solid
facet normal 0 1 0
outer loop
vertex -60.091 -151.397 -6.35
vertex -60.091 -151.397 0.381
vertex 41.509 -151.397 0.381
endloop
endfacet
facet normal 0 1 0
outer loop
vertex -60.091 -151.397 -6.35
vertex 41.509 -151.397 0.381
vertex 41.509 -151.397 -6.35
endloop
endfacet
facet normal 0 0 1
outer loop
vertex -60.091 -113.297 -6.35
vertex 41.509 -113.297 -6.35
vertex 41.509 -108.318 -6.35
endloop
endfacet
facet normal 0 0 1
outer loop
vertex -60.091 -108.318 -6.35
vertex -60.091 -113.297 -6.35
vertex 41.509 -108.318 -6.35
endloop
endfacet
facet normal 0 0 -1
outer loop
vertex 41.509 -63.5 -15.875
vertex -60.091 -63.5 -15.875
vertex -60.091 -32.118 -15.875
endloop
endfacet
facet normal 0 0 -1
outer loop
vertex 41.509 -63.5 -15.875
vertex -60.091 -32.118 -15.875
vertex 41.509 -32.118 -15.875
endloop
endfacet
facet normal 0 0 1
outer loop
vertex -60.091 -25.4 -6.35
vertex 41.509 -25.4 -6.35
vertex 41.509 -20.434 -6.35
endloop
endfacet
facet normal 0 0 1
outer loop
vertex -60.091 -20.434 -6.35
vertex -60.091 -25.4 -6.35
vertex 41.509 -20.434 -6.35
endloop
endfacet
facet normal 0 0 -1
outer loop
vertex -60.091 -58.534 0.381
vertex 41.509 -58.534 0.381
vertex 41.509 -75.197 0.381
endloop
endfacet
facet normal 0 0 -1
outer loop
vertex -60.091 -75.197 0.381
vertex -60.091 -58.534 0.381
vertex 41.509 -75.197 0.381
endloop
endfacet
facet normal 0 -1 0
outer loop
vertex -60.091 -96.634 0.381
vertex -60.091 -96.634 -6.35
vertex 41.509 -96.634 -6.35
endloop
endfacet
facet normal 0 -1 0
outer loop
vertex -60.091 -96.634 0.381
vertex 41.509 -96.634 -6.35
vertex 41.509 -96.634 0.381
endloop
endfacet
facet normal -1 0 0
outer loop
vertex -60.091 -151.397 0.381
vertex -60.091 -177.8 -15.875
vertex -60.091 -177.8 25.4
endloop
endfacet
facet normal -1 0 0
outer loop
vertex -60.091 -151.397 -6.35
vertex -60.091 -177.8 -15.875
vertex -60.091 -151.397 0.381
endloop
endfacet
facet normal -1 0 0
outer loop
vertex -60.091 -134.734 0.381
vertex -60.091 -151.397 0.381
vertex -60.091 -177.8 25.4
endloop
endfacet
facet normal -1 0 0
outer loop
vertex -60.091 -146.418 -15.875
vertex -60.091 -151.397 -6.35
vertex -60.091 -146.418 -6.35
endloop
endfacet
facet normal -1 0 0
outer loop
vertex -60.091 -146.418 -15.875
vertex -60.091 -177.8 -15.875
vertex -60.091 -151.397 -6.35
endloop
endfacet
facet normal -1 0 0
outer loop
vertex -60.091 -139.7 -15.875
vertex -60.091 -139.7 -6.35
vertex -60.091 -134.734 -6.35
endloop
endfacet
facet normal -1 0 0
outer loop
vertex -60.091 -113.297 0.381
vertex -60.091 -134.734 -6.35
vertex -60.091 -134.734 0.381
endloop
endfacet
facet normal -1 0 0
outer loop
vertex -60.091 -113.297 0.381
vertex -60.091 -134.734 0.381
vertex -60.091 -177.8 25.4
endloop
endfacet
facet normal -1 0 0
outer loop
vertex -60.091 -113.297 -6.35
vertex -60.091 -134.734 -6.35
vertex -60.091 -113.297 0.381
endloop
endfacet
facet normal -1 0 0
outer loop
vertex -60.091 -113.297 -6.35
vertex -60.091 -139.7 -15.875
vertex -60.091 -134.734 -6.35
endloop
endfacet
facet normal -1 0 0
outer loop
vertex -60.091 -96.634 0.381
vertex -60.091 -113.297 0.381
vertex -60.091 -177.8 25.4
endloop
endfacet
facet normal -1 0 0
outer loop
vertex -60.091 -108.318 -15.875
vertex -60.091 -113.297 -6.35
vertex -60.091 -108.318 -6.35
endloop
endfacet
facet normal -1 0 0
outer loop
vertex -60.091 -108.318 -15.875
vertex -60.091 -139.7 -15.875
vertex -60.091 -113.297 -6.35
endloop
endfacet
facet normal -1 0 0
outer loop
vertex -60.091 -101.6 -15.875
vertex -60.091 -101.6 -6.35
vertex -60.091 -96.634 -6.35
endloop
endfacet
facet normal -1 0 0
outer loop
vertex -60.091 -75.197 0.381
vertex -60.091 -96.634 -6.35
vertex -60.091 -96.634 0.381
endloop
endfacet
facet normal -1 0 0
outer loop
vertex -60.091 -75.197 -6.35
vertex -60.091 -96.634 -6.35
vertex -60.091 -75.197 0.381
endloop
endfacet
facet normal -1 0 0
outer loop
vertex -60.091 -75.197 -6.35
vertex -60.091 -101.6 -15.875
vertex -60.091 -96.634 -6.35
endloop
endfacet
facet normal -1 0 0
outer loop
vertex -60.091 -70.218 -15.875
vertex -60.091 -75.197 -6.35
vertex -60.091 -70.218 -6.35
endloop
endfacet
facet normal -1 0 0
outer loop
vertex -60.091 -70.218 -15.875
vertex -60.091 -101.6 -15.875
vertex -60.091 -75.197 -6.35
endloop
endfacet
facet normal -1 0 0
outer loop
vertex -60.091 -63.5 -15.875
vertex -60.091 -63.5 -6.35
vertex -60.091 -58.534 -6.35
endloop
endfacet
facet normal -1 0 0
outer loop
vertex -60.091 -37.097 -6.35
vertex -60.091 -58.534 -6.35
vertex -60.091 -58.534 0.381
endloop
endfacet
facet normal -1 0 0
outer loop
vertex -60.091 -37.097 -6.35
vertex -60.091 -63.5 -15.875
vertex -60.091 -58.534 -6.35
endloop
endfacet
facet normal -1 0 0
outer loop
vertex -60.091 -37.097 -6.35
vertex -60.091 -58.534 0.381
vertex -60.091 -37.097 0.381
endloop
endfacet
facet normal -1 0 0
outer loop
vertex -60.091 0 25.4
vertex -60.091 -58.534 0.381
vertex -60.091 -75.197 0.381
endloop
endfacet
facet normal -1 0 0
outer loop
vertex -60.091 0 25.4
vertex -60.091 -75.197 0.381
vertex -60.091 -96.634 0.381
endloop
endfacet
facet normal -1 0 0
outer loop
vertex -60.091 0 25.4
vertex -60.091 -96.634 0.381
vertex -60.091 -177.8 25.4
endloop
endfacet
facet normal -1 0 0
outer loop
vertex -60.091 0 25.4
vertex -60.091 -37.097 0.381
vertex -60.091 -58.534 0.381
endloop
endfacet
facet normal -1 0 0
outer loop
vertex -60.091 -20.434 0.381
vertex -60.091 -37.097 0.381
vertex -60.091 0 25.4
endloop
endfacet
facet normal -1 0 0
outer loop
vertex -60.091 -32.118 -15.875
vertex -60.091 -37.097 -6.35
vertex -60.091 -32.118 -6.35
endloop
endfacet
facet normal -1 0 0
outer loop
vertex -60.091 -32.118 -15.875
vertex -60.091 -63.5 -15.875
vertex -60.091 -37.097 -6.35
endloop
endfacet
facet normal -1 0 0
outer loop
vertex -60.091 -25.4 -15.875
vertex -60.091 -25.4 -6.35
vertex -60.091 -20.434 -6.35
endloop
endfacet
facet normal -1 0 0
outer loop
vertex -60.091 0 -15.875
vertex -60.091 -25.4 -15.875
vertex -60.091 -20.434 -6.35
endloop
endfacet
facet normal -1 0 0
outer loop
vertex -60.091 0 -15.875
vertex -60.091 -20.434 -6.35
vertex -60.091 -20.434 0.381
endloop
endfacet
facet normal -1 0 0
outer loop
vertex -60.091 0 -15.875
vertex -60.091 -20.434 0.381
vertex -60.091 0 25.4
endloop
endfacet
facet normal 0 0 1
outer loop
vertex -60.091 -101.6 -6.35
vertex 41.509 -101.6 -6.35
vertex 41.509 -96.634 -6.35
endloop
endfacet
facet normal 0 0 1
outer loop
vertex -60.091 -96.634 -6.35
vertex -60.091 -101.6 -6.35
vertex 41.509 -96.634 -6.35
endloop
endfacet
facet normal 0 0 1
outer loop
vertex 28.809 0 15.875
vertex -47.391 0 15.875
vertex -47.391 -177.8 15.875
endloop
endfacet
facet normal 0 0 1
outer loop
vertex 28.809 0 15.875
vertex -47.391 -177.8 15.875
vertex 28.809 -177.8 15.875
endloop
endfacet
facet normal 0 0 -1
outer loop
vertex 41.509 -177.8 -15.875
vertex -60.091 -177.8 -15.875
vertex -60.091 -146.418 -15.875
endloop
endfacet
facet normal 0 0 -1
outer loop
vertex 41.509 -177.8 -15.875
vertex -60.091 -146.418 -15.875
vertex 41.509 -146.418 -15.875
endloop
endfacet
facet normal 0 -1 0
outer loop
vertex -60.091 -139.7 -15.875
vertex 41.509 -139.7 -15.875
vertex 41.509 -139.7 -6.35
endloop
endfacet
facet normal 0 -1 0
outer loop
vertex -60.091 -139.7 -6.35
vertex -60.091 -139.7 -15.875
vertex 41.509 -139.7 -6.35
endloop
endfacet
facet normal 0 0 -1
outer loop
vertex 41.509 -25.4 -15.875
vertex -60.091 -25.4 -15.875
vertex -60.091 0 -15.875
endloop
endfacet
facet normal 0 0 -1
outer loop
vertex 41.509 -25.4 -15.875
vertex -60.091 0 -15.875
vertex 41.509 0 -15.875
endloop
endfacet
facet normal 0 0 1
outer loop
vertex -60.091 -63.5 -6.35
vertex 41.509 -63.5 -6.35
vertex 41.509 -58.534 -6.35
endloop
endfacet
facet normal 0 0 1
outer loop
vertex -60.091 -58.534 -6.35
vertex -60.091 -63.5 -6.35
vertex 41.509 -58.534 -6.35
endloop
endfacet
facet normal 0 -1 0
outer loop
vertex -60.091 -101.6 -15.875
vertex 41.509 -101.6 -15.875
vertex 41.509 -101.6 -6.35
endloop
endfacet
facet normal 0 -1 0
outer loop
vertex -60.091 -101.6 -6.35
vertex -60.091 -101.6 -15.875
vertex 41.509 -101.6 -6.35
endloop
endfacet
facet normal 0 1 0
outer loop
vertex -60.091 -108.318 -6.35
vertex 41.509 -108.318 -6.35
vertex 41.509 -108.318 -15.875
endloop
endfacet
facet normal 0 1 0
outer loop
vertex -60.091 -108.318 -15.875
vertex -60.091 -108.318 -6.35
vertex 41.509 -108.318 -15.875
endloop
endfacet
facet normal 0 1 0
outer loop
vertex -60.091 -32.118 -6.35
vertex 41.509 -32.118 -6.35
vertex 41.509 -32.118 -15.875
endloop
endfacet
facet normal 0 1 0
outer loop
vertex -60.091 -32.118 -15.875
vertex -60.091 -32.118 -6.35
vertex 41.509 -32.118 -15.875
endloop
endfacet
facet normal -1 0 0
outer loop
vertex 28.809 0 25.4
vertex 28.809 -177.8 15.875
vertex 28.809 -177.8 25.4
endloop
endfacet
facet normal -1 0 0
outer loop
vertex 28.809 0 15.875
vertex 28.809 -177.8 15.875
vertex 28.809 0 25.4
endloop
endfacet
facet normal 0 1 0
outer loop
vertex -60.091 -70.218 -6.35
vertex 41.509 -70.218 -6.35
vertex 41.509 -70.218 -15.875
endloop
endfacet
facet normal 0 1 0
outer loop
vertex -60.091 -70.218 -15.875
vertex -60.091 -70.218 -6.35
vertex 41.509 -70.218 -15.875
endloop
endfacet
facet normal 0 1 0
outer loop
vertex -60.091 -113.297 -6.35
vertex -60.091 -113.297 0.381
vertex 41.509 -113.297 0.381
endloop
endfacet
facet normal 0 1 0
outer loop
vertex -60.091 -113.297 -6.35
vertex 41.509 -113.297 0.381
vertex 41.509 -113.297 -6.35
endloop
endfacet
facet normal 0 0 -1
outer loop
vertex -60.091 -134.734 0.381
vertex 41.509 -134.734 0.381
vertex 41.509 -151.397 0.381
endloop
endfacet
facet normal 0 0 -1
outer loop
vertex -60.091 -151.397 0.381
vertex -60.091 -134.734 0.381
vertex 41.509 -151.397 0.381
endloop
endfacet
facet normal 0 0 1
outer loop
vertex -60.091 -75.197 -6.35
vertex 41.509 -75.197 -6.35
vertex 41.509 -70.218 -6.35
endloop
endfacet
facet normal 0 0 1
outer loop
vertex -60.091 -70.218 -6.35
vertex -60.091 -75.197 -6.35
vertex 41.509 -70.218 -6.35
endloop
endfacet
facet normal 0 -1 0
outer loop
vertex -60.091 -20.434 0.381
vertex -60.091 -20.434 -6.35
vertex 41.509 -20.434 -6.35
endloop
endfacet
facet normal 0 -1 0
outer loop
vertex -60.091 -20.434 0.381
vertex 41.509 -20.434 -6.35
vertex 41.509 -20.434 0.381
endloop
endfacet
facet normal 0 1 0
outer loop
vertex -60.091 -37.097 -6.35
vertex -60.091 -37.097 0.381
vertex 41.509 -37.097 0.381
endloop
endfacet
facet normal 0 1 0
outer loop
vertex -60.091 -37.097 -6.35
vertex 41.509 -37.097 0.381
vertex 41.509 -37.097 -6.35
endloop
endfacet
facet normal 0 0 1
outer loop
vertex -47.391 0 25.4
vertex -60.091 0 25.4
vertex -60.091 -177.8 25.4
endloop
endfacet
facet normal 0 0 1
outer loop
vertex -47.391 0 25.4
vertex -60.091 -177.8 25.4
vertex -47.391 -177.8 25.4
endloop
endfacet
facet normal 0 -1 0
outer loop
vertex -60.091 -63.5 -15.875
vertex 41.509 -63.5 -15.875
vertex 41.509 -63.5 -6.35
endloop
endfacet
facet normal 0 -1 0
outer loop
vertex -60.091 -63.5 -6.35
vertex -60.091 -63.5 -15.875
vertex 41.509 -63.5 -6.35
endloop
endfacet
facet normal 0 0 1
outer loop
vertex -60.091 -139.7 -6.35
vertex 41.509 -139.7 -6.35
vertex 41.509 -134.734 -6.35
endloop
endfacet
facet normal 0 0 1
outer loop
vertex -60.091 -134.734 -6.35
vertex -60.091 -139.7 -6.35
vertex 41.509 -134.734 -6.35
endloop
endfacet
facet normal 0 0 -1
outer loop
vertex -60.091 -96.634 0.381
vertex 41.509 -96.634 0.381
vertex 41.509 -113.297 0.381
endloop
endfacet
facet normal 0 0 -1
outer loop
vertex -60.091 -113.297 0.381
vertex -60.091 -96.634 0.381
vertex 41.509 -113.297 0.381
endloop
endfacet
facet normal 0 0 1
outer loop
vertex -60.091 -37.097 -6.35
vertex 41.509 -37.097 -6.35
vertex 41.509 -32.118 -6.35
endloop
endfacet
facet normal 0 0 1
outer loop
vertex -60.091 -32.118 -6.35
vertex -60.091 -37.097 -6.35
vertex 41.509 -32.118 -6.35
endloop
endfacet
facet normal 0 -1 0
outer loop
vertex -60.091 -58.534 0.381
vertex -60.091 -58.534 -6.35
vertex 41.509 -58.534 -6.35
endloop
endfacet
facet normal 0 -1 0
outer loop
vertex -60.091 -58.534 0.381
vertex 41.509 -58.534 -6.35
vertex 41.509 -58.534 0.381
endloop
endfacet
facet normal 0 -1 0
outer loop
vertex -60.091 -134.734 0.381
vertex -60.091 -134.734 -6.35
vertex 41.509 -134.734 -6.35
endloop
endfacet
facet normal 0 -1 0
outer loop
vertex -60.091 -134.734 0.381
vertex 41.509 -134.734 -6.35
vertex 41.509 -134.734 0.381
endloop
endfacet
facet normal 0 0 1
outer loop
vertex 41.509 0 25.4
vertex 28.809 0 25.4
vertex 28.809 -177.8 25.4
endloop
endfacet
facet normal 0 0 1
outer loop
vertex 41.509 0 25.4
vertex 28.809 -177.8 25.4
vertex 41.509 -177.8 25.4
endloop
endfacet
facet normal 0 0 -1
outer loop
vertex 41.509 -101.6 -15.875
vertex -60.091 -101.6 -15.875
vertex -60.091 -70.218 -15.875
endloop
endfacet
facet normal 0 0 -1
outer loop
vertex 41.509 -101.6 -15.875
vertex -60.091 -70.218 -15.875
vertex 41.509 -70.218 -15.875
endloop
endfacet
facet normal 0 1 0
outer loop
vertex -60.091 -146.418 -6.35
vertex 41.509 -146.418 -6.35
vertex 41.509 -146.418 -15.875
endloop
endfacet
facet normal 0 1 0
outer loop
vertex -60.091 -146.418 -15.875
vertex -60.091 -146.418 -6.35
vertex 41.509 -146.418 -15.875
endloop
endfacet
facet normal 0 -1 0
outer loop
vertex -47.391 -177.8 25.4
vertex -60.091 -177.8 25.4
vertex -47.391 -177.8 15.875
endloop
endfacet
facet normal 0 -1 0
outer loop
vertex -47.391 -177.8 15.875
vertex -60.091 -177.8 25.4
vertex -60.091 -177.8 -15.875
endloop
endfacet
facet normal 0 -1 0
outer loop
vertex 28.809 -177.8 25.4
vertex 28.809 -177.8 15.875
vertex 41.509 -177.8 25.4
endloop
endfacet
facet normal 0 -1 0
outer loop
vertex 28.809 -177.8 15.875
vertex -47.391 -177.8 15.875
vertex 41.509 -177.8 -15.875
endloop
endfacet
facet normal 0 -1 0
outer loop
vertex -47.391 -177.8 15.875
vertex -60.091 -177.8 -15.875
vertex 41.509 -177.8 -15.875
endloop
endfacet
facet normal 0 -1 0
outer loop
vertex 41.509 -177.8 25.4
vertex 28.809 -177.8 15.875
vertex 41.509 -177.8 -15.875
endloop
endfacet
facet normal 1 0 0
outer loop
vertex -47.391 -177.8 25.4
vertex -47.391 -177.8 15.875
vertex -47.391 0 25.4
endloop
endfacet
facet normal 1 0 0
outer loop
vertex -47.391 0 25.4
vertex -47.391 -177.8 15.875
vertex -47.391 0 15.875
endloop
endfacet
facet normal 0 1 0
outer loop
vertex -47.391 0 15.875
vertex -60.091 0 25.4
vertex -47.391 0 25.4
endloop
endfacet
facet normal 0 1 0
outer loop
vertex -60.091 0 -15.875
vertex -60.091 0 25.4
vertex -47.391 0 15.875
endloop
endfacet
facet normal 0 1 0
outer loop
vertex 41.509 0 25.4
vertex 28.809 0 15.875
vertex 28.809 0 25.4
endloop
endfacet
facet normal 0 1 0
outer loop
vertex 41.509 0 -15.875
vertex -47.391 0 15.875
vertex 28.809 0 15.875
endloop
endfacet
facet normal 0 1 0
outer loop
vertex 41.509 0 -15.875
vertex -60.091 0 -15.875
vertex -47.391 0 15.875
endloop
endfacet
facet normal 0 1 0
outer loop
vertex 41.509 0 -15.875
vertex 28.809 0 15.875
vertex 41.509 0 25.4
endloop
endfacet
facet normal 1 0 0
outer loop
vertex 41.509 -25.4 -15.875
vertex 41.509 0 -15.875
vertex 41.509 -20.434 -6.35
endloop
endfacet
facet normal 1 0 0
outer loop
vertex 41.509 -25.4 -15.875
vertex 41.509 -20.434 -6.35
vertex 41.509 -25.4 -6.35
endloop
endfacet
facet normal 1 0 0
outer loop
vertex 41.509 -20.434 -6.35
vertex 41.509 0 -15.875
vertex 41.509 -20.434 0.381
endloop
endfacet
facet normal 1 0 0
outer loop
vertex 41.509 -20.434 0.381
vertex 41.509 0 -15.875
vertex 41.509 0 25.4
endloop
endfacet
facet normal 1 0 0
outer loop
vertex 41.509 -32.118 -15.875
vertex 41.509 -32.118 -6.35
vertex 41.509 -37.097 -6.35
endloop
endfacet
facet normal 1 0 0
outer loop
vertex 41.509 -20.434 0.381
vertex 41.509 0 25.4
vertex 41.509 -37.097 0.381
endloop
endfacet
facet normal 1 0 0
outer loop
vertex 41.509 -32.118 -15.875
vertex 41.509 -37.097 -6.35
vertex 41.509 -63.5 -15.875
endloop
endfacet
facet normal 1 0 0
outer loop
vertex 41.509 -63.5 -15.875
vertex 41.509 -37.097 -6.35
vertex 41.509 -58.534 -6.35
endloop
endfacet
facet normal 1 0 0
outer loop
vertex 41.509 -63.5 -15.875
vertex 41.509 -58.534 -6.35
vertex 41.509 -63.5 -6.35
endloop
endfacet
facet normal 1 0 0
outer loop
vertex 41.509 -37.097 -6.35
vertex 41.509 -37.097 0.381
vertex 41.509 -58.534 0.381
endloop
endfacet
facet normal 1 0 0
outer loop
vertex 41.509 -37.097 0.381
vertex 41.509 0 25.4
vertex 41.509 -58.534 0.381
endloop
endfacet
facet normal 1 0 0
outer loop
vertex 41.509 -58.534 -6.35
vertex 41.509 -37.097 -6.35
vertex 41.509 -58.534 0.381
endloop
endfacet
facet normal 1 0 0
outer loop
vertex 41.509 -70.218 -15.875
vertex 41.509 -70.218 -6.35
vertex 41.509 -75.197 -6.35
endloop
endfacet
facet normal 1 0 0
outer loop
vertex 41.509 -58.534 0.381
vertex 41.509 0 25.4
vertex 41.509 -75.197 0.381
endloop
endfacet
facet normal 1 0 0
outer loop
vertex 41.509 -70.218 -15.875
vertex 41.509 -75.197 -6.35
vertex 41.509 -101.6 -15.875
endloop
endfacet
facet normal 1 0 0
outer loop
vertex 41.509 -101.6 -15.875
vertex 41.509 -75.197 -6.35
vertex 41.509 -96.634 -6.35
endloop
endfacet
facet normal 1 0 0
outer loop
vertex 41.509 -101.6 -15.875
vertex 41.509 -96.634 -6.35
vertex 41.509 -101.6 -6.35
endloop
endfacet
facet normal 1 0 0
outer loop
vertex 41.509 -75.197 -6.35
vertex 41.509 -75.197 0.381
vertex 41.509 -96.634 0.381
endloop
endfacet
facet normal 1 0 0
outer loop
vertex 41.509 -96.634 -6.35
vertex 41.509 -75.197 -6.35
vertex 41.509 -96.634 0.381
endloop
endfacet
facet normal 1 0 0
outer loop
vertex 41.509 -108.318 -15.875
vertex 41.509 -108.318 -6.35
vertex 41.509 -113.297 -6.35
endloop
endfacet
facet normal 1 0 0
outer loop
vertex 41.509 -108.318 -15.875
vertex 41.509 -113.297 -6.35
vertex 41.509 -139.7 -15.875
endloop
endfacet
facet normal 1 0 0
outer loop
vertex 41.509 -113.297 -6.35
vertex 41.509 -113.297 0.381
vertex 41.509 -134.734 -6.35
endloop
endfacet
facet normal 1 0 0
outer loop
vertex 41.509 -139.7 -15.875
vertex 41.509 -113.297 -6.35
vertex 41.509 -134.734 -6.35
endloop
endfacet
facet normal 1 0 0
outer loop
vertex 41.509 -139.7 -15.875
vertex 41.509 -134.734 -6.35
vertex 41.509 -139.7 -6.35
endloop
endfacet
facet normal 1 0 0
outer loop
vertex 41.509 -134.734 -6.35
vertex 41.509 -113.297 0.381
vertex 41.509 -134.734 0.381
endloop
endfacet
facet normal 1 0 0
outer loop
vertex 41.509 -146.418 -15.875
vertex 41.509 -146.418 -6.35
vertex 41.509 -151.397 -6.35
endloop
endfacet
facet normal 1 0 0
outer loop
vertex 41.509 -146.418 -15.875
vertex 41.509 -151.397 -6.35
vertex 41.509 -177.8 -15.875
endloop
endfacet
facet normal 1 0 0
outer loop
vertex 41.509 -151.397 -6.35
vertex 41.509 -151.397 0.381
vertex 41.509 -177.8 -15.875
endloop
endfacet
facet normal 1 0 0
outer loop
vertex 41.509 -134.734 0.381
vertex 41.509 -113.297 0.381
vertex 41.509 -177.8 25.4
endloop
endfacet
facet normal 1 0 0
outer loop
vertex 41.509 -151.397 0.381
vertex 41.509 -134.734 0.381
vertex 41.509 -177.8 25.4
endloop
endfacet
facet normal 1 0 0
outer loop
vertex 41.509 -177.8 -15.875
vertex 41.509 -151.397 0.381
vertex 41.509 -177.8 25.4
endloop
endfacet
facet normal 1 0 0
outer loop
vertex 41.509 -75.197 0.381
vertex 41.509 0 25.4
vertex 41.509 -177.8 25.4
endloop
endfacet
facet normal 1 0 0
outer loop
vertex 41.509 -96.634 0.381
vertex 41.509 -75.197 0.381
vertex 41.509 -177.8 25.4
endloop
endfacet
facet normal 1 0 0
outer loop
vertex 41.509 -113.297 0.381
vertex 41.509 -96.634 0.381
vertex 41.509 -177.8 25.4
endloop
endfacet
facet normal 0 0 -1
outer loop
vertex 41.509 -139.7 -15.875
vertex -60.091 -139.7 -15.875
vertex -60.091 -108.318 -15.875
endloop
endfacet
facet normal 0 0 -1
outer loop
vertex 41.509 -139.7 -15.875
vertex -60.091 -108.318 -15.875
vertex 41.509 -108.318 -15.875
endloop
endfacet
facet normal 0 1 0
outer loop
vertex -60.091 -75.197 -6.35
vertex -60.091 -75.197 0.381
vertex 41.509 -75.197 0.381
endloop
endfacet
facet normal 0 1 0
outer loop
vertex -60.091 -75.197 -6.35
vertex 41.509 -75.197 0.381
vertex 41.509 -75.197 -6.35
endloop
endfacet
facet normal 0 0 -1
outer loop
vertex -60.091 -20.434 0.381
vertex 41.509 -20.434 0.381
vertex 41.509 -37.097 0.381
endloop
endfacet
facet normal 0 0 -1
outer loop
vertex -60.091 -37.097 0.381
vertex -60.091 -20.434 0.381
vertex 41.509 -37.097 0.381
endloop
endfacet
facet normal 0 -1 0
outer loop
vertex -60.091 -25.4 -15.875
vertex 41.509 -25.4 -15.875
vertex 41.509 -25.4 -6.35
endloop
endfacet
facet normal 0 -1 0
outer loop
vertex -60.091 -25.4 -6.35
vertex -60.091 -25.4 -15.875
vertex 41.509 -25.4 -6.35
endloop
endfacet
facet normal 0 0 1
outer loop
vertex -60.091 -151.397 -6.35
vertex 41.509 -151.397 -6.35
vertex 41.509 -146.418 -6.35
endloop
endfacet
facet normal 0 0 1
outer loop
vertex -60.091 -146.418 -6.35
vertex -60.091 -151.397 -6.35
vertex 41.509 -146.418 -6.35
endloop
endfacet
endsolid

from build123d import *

# Parameters (mm, degrees)
F0_W      = 101.6
F0_H      = 177.8
F1_DEPTH  = 15.875
F1_FACE_W = 101.6
F1_FACE_H = 177.8
F2_DEPTH  = 15.875
F4_DEPTH  = 101.601
F5_W      = 12.7
F5_H      = 177.8
F6_DEPTH  = 9.525


with BuildPart() as f1:
    # F0 (on Top) → F1 (new body)
    with BuildSketch(Plane.XY):
        with Locations((-9.29141, -88.9)):
            Rectangle(F0_W, F0_H)
    extrude(amount=F1_DEPTH)

    # F1_face (on face) → F2 (join)
    with BuildSketch(Plane(origin=(-9.29141, -88.9, 0), x_dir=(1, 0, 0), z_dir=(0, 0, -1))):
        Rectangle(F1_FACE_W, F1_FACE_H)
    extrude(amount=F2_DEPTH)

    # F3 (on face) → F4 (cut, through all)
    with BuildSketch(Plane.YZ.offset(41.50859)):
        Polygon((-32.1183, -15.875), (-25.4, -15.875), (-25.4, -6.35), (-20.4343, -6.35), (-20.4343, 0.381), (-37.0967, 0.381), (-37.0967, -6.35), (-32.1183, -6.35), align=None)
        Polygon((-70.2183, -15.875), (-63.5, -15.875), (-63.5, -6.35), (-58.5343, -6.35), (-58.5343, 0.381), (-75.1967, 0.381), (-75.1967, -6.35), (-70.2183, -6.35), align=None)
        Polygon((-108.3183, -15.875), (-101.6, -15.875), (-101.6, -6.35), (-96.6343, -6.35), (-96.6343, 0.381), (-113.2967, 0.381), (-113.2967, -6.35), (-108.3183, -6.35), align=None)
        Polygon((-146.4183, -6.35), (-146.4183, -15.875), (-139.7, -15.875), (-139.7, -6.35), (-134.7343, -6.35), (-134.7343, 0.381), (-151.3967, 0.381), (-151.3967, -6.35), align=None)
    extrude(amount=-F4_DEPTH, mode=Mode.SUBTRACT)

    # F5 (on face) → F6 (join)
    with BuildSketch(Plane.XY.offset(15.875)):
        with Locations((-53.74141, -88.9)):
            Rectangle(F5_W, F5_H)
        with Locations((35.15859, -88.9)):
            Rectangle(F5_W, F5_H)
    extrude(amount=F6_DEPTH)


solid = f1.part
